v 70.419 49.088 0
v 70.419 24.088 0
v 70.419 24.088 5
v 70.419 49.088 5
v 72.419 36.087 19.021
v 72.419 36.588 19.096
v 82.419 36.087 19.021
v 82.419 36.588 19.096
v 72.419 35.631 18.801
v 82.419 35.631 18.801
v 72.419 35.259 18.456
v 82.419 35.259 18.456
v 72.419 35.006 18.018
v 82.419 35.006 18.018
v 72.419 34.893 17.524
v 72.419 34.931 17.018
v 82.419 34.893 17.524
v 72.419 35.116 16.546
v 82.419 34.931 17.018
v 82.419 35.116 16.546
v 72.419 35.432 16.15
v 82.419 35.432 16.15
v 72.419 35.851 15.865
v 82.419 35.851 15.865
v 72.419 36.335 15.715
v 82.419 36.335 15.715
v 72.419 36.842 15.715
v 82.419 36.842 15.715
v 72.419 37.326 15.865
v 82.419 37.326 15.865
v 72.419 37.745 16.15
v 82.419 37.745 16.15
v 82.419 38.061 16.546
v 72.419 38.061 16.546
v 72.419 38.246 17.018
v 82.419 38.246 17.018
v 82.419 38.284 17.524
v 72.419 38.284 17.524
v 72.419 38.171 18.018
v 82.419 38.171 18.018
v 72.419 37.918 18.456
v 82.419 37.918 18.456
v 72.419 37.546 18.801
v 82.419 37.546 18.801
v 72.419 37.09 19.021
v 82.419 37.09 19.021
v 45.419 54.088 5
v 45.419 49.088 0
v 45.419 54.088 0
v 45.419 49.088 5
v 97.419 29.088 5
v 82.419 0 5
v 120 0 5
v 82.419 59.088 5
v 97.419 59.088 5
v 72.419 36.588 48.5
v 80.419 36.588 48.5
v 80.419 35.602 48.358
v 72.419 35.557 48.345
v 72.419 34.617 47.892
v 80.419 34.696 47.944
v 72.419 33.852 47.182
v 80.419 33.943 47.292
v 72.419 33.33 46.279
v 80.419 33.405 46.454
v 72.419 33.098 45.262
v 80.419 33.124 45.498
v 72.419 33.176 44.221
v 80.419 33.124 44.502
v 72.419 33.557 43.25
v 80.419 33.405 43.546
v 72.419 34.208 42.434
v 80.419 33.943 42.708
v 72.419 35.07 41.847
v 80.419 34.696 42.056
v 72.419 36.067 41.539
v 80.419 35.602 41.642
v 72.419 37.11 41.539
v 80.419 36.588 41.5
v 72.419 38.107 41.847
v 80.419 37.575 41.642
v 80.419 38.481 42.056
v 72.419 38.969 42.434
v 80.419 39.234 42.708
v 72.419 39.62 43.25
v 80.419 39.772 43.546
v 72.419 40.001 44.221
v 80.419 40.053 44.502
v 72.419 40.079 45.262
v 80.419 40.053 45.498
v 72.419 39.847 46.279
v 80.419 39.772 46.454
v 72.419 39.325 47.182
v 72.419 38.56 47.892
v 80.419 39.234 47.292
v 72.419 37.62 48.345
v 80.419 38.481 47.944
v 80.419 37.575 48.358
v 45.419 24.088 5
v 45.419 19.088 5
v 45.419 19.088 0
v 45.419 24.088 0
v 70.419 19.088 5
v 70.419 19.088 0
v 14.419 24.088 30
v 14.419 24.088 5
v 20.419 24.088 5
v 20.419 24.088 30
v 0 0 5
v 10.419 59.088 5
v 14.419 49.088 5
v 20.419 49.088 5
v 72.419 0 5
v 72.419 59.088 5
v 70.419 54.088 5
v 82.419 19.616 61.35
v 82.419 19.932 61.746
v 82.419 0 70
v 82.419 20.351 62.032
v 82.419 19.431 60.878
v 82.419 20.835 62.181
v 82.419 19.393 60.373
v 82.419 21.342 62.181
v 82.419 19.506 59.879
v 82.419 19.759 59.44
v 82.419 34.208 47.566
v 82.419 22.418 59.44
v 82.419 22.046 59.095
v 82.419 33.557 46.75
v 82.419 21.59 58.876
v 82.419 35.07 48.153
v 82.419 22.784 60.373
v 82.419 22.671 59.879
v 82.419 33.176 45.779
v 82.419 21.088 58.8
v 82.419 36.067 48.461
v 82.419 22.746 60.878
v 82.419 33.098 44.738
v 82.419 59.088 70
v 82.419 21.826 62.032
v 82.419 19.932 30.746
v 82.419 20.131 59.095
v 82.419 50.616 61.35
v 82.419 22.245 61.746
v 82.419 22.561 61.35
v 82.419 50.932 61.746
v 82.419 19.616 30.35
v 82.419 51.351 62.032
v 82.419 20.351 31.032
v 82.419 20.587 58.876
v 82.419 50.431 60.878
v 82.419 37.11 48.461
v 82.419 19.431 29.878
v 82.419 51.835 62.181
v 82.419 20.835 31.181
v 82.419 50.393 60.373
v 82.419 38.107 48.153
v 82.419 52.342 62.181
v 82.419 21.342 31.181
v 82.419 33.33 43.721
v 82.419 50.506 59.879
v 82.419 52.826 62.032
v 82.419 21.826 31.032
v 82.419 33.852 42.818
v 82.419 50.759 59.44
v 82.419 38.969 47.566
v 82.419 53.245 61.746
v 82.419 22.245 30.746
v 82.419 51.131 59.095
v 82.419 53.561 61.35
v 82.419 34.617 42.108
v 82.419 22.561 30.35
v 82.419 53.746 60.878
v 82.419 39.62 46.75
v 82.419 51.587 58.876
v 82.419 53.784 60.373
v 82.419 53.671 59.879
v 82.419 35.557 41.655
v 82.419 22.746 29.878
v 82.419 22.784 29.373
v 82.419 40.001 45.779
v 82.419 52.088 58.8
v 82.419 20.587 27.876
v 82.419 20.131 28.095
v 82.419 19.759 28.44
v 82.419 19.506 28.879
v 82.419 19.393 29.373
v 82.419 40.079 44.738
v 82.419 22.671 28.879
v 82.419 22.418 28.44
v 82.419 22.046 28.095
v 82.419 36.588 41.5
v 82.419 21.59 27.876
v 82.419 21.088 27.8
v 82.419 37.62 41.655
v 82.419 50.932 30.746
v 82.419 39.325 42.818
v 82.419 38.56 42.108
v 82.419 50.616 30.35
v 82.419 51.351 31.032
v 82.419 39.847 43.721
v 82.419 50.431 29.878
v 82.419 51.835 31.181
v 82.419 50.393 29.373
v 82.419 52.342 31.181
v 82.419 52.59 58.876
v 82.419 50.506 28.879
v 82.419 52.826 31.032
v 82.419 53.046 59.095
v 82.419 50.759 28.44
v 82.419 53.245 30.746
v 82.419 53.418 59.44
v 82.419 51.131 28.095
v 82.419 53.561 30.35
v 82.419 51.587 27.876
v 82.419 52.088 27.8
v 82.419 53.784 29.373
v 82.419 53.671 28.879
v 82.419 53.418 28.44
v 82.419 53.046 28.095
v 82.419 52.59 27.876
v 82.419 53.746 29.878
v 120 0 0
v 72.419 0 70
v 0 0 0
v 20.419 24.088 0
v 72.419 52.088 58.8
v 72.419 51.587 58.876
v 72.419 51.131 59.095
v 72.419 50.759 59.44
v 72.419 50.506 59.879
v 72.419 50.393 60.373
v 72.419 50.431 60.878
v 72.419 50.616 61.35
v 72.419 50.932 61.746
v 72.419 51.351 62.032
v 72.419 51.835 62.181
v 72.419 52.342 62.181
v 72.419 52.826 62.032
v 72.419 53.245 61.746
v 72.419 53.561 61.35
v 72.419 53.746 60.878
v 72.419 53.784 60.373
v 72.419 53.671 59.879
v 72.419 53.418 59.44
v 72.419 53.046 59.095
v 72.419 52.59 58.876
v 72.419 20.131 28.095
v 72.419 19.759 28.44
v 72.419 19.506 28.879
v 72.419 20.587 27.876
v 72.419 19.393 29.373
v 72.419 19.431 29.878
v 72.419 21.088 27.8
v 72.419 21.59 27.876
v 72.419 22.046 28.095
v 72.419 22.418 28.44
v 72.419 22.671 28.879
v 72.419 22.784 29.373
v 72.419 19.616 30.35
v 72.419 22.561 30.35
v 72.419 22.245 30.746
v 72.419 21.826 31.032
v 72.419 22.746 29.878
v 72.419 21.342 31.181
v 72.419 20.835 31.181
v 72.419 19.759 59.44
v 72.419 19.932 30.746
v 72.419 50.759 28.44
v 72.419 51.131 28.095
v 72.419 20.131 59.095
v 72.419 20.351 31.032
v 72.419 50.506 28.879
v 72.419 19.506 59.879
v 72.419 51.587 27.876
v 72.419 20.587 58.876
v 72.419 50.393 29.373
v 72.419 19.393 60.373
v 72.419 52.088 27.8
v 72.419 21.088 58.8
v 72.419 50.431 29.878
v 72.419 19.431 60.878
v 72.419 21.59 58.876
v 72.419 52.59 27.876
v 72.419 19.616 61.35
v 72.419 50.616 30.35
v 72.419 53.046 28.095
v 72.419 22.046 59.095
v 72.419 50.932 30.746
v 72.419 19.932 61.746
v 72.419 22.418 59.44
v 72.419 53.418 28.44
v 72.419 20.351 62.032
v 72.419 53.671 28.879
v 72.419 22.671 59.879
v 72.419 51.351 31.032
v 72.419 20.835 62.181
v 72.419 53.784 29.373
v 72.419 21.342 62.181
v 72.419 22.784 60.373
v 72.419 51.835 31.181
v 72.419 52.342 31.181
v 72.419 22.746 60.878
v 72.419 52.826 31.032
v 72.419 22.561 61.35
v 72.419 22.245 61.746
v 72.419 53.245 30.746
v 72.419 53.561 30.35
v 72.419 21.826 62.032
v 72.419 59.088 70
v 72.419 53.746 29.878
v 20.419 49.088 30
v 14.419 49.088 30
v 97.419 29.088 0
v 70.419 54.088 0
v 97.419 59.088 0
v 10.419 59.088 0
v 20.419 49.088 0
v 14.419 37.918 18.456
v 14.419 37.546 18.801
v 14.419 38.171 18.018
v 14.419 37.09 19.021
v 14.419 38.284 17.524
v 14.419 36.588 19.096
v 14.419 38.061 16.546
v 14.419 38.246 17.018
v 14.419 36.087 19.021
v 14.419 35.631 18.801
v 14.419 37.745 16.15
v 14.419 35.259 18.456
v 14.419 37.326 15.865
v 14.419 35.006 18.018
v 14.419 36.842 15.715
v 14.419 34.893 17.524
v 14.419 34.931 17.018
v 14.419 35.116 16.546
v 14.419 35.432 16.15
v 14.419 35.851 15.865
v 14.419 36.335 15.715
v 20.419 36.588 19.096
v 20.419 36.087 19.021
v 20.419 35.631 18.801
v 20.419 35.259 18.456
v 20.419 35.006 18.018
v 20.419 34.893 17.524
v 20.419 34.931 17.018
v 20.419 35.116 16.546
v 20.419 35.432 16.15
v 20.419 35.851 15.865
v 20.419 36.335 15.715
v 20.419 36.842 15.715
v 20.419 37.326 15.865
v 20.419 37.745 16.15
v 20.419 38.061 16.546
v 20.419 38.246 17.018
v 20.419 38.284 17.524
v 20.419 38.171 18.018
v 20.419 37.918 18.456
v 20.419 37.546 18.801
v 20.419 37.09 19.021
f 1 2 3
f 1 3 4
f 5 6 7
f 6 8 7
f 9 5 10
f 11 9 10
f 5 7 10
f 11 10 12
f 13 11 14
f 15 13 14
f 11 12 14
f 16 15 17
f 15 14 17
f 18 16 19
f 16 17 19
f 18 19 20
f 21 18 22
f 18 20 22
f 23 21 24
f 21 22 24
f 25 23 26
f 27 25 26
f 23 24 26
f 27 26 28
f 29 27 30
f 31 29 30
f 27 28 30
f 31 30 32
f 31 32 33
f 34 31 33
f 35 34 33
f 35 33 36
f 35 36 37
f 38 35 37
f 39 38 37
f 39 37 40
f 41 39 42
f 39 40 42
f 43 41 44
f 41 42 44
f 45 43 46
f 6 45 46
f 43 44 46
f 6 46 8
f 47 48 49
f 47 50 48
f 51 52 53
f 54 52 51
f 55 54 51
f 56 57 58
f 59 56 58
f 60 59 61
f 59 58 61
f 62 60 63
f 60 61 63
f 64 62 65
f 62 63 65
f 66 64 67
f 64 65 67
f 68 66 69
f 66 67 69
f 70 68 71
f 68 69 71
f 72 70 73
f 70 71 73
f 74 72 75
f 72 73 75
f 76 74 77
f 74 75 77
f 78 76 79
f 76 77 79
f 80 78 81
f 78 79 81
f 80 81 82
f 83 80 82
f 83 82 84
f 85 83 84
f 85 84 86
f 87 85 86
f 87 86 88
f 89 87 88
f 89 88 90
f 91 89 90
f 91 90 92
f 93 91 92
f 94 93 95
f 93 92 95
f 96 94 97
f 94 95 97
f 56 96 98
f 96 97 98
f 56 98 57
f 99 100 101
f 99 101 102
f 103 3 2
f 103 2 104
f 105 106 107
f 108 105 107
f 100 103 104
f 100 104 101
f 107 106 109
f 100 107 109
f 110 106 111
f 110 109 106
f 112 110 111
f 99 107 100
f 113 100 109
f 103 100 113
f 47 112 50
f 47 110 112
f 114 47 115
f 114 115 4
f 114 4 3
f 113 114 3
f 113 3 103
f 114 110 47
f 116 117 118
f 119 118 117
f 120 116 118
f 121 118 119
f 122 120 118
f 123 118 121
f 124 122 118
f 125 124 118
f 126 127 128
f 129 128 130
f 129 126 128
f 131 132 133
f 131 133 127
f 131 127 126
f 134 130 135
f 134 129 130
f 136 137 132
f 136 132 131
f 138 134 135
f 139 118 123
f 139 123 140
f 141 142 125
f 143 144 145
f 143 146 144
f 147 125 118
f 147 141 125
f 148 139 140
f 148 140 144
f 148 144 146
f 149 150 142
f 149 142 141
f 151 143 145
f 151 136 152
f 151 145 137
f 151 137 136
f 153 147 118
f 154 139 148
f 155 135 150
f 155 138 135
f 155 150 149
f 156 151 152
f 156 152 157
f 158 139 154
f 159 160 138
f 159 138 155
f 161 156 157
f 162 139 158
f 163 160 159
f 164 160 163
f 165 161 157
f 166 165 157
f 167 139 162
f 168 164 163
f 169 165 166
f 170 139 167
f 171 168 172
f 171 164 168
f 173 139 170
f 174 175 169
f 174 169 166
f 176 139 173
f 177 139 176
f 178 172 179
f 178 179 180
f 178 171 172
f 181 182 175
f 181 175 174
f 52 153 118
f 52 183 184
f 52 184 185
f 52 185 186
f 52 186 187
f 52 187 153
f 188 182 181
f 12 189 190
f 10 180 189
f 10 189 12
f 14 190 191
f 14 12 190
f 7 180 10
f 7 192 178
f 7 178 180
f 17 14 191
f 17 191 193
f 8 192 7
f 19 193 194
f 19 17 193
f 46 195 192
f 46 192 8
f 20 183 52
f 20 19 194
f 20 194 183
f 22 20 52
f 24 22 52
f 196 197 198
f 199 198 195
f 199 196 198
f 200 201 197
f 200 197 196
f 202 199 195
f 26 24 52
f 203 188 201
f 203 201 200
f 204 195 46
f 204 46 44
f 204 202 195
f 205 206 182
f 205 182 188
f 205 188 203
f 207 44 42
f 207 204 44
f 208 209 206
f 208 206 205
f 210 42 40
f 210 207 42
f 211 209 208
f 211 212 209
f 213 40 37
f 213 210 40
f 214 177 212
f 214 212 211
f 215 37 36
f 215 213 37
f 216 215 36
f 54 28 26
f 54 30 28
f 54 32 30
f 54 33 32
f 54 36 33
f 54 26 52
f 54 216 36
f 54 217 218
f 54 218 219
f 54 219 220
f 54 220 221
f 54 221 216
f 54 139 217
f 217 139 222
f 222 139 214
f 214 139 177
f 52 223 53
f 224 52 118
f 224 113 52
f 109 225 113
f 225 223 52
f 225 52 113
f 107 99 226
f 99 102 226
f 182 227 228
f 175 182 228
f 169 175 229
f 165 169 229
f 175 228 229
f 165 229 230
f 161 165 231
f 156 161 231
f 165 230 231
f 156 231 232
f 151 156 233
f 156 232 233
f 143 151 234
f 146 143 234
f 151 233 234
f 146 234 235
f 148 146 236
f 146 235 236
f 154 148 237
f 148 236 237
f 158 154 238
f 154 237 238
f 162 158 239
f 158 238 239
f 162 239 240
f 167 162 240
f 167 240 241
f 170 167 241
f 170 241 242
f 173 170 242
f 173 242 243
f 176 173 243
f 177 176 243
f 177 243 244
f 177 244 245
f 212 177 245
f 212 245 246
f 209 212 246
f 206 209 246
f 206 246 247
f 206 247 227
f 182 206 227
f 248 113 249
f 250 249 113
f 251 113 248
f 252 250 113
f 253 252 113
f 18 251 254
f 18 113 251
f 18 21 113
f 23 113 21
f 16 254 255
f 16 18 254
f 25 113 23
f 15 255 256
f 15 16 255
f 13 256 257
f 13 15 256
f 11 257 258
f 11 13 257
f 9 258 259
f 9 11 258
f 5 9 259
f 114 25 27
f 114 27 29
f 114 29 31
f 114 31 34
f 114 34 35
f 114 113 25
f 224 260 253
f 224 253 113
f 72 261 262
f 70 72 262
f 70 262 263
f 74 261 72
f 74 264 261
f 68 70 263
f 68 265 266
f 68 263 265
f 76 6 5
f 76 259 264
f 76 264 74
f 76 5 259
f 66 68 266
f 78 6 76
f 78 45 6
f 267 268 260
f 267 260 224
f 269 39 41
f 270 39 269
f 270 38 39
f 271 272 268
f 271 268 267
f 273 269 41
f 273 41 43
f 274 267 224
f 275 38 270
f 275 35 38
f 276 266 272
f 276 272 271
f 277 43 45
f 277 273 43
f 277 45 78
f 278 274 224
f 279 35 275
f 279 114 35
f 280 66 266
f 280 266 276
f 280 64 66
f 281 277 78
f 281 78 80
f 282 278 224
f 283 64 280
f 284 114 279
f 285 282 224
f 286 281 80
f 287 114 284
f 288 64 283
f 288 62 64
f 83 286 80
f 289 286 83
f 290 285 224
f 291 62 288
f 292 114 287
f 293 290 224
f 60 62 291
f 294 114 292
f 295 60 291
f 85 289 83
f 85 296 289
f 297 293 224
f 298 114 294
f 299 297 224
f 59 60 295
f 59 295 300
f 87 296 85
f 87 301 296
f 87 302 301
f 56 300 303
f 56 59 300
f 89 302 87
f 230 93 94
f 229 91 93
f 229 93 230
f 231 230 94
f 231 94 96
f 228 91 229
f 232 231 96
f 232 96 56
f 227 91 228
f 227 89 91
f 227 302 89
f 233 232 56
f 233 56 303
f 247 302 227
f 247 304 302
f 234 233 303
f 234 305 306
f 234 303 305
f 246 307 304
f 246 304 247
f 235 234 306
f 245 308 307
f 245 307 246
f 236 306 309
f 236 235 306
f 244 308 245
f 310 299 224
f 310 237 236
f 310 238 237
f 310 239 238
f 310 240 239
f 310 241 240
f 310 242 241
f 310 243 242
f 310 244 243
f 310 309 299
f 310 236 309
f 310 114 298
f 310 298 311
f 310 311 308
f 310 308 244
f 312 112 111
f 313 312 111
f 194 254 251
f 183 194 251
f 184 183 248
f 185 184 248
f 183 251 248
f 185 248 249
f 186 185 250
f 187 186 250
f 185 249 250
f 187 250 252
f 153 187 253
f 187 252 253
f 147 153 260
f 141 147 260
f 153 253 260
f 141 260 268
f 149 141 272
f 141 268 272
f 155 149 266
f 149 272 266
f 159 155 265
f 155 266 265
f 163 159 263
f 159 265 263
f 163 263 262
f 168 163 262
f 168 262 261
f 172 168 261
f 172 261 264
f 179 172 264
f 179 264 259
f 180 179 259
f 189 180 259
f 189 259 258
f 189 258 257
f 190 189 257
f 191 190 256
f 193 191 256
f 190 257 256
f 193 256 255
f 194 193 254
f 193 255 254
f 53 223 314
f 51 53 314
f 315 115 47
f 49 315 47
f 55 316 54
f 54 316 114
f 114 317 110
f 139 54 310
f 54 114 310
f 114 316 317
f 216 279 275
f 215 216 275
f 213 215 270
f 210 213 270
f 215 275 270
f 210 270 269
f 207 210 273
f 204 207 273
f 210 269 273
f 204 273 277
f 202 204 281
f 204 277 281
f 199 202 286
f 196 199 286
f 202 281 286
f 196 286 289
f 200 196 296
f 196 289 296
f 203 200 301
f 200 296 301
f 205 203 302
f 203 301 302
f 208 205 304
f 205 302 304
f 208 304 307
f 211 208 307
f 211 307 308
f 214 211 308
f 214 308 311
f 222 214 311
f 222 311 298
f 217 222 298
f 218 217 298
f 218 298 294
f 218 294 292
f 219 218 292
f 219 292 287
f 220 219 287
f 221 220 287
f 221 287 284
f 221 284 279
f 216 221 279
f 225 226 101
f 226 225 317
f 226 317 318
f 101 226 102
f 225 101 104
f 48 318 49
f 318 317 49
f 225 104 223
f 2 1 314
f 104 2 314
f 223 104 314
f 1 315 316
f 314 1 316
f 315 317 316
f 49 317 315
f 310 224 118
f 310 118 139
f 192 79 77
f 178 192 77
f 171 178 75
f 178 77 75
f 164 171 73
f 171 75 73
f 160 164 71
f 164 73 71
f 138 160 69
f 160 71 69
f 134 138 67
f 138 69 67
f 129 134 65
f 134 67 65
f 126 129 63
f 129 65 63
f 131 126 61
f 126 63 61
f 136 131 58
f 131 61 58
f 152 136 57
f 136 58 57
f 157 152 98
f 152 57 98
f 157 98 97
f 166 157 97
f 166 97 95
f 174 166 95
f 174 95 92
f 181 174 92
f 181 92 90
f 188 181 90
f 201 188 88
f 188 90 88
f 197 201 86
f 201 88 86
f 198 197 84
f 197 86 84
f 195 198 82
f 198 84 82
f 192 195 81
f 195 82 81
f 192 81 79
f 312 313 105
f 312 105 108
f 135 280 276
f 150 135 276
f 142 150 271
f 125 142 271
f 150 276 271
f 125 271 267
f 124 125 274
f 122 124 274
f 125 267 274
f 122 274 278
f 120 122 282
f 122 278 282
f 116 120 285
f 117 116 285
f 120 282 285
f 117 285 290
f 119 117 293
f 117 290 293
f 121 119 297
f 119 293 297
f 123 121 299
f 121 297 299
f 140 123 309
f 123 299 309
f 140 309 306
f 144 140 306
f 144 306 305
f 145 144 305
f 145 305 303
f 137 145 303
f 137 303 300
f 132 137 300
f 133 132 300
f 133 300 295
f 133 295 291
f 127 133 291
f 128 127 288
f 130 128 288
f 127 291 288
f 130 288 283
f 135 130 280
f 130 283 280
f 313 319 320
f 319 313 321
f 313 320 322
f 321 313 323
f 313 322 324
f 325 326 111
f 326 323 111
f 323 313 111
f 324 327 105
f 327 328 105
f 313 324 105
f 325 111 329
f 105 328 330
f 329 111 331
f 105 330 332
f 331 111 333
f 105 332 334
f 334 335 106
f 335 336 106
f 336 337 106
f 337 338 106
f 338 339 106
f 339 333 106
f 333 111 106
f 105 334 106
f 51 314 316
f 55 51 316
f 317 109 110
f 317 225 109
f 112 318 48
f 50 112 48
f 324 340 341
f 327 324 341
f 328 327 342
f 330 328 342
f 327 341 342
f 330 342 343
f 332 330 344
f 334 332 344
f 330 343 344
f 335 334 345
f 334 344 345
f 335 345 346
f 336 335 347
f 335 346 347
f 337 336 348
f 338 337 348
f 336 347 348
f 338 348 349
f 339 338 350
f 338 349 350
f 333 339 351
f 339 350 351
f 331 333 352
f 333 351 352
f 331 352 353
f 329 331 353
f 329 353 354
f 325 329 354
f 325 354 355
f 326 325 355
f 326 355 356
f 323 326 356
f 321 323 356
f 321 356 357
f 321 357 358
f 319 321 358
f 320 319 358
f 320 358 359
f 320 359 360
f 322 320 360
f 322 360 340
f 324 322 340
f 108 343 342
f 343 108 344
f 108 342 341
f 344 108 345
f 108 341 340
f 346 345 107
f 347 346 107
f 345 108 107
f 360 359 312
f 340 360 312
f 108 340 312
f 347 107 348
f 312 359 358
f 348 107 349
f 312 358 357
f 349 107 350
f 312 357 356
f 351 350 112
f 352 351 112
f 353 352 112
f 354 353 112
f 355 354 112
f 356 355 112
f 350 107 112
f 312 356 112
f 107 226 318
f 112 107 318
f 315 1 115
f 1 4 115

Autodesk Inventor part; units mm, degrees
ref_plane "YZ Plane" through (0, 0, 0) normal (1, 0, 0) x (0, 1, 0)
ref_plane "XZ Plane" through (0, 0, 0) normal (0, 1, 0) x (-1, 0, 0)
ref_plane "XY Plane" through (0, 0, 0) normal (0, 0, 1) x (1, 0, 0)
sketch "Szkic1" plane through (0, 0, 0) normal (0, 0, 1) x (1, 0, 0)
  line L0 (0, 0) -> (120, 0)
  line L1 (0, 0) -> (10.4189, 59.0885)
  line L2 (0, 0) -> (60, 0) construction
  line L3 (120, 0) -> (97.4189, 29.0885)
  line L4 (10.4189, 59.0885) -> (70.4189, 59.0885)
  line L5 (10.4189, 59.0885) -> (70.4189, 59.0885) construction
  line L6 (97.4189, 29.0885) -> (97.4189, 59.0885)
  line L7 (97.4189, 59.0885) -> (70.4189, 59.0885)
  line L8 (20.4189, 49.0885) -> (70.4189, 49.0885)
  line L9 (70.4189, 49.0885) -> (70.4189, 24.0885)
  line L10 (70.4189, 24.0885) -> (20.4189, 24.0885)
  line L11 (20.4189, 24.0885) -> (20.4189, 49.0885)
  line L12 (20.4189, 49.0885) -> (14.4189, 49.0885)
  line L13 (14.4189, 49.0885) -> (14.4189, 24.0885)
  line L14 (14.4189, 24.0885) -> (20.4189, 24.0885)
  line L15 (20.4189, 24.0885) -> (20.4189, 49.0885)
  line L16 (70.4189, 49.0885) -> (80.4189, 49.0885)
  line L17 (80.4189, 49.0885) -> (80.4189, 24.0885)
  line L18 (80.4189, 24.0885) -> (70.4189, 24.0885)
  line L19 (70.4189, 24.0885) -> (70.4189, 49.0885)
  dimension "d0" = 120
  dimension "d1" = 60
  dimension "d2" = 80
  dimension "d4" = 60
  dimension "d5" = 0
  dimension "d6" = 50
  dimension "d7" = 25
  dimension "d8" = 10
  dimension "d9" = 10
  dimension "d10" = 6
  dimension "d11" = 10
  dimension "d23" = 27
  dimension "d24" = 30
extrude "Wyciągnięcie proste1" add sketch "Szkic1" along normal blind 5
extrude "Wyciągnięcie proste2" add sketch "Szkic1" along normal blind 30 contours L11 L14 L13 L12
extrude "Wyciągnięcie proste3" add sketch "Szkic1" along normal blind 50 contours L16 L17 L18 L9
sketch "Szkic2" plane through (70.4189, 49.0885, 5) normal (0, 1, 0) x (1, 0, 0)
  point P0 (-70.4189, 5)
sketch "Szkic3" plane through (70.4189, 49.0885, 5) normal (0, 1, 0) x (1, 0, 0)
  line L0 (0, 0) -> (0, -45) projected
  line L1 (-70.4189, 0) -> (49.5811, 0) projected
  line L2 (0, -45) -> (10, -45)
  line L3 (10, -45) -> (10, 0)
  line L4 (10, 0) -> (0, 0)
  line L5 (0, 0) -> (0, -45)
  point P0 (-70.4189, 5)
  dimension "d18" = 10
extrude "Wyciągnięcie proste4" add sketch "Szkic3" along normal blind 10
sketch "Szkic4" plane through (70.4189, 24.0885, 5) normal (0, -1, 0) x (1, 0, 0)
  line L0 (0, 45) -> (10, 45) projected
  line L1 (0, 0) -> (0, -5) projected
  line L2 (10, 45) -> (0, 45)
  line L3 (0, 45) -> (0, 0)
  line L4 (0, 0) -> (10, 0)
  line L5 (10, 0) -> (10, 45)
  point P0 (-70.4189, -5)
extrude "Wyciągnięcie proste5" add sketch "Szkic4" along normal up to surface (24.0885 mm away)
sketch "Szkic5" plane through (0, 0, 50) normal (0, 0, 1) x (1, 0, 0)
  line L0 (70.4189, 49.0885) -> (70.4189, 59.0885) projected
  line L1 (80.4189, 59.0885) -> (80.4189, 0) projected
  line L2 (70.4189, 59.0885) -> (80.4189, 59.0885)
  line L3 (80.4189, 59.0885) -> (80.4189, 0)
  line L4 (80.4189, 0) -> (70.4189, 0)
  line L5 (70.4189, 0) -> (70.4189, 59.0885)
  point P0 (0, 0)
extrude "Wyciągnięcie proste6" add sketch "Szkic5" along normal blind 20
sketch "Szkic6" plane through (70.4189, 24.0885, 0) normal (-1, 0, 0) x (0, 0, 1)
  line L0 (5, 35) -> (70, 35) projected
  line L1 (30, 25) -> (30, 0) projected
  point P0 (0, -24.0885)
  point P1 (45, 12.5)
  point P2 (30, 12.5)
  dimension "d27" = 22.5
  dimension "d28" = 15
hole "Otwór1" at (70.4189, 36.5885, 45) direction (1, 0, 0) diameter 7 end through all
sketch "Szkic7" plane through (80.4189, 0, 5) normal (1, 0, 0) x (0, 0, -1)
  line L0 (0, 59.0885) -> (-65, 59.0885) projected
  line L1 (0, 0) -> (0, 24.0885) projected
  line L2 (-65, 59.0885) -> (0, 59.0885)
  line L3 (0, 59.0885) -> (0, 0)
  line L4 (0, 0) -> (-65, 0)
  line L5 (-65, 0) -> (-65, 59.0885)
  circle A0 centre (-40, 36.5885) radius 3.5 projected
  circle A1 centre (-40, 36.5885) radius 3.5
  point P0 (5, 0)
extrude "Wyciągnięcie proste7" add sketch "Szkic7" along normal blind 2
sketch "Szkic8" plane through (70.4189, 24.0885, 0) normal (-1, 0, 0) x (0, 0, 1)
  line L0 (5, 35) -> (70, 35) projected
  line L1 (5, -24.0885) -> (70, -24.0885) projected
  line L2 (5, 35) -> (70, 35)
  line L3 (70, 35) -> (70, -24.0885)
  line L4 (70, -24.0885) -> (5, -24.0885)
  line L5 (5, -24.0885) -> (5, 35)
  line L6 (5, 35) -> (70, 35)
  line L7 (70, 35) -> (70, -24.0885)
  line L8 (70, -24.0885) -> (5, -24.0885)
  line L9 (5, -24.0885) -> (5, 35)
  circle A0 centre (45, 12.5) radius 3.5 projected
  circle A1 centre (45, 12.5) radius 3.5
  point P0 (0, -24.0885)
  point P1 (70, 35)
extrude "Wyciągnięcie proste8" cut sketch "Szkic8" against normal blind 2
sketch "Szkic9" plane through (82.4189, 0, 5) normal (1, 0, 0) x (0, 0, -1)
  circle A0 centre (-40, 36.5885) radius 3.5 projected
  point P0 (5, 0)
  point P1 (-55.5, 52.0885)
  point P2 (-24.5, 52.0885)
  point P3 (-24.5, 52.0885)
  point P4 (-24.5, 21.0885)
  point P5 (-55.5, 21.0885)
  dimension "d40" = 31
  dimension "d41" = 31
  dimension "d42" = 31
  dimension "d43" = 31
  dimension "d44" = 15.5
  dimension "d45" = 15.5
hole "Otwór2" at (82.4189, 52.0885, 60.5) at (82.4189, 52.0885, 29.5) at (82.4189, 21.0885, 60.5) at (82.4189, 21.0885, 29.5) direction (-1, 0, 0) diameter 3.4 end through all clearance for "Śruba ze łbem stożkowym ISO 2009/7046" size "M3" standard "ISO"
sketch "Szkic10" plane through (14.4189, 24.0885, 5) normal (-1, 0, 0) x (0, 0, 1)
  point P0 (-5, -24.0885)
  point P1 (12.3965, 12.5)
hole "Otwór3" at (14.4189, 36.5885, 17.3965) direction (1, 0, 0) diameter 3.4 end through all clearance for "Śruba ze łbem stożkowym ISO 2009/7046" size "M3" standard "ISO"
sketch "Szkic12" plane through (0, 0, 5) normal (0, 0, 1) x (1, 0, 0)
  line L0 (20.4189, 49.0885) -> (70.4189, 49.0885) projected
  line L1 (70.4189, 49.0885) -> (70.4189, 54.0885)
  line L2 (70.4189, 54.0885) -> (45.4189, 54.0885)
  line L3 (70.4189, 24.0885) -> (20.4189, 24.0885) projected
  line L4 (70.4189, 24.0885) -> (70.4189, 19.0885)
  line L5 (70.4189, 19.0885) -> (45.4189, 19.0885)
  line L6 (45.4189, 19.0885) -> (45.4189, 54.0885)
  point P0 (0, 0)
  point P1 (45.4189, 24.0885)
  point P2 (45.4189, 49.0885)
  dimension "d63" = 5
  dimension "d64" = 5
extrude "Wyciągnięcie proste10" cut sketch "Szkic12" against normal blind 10
equation "\"d41\" = d40"
equation "\"d42\" = d40"
equation "\"d43\" = d40"
properties part number "podstawka pod silnik"
